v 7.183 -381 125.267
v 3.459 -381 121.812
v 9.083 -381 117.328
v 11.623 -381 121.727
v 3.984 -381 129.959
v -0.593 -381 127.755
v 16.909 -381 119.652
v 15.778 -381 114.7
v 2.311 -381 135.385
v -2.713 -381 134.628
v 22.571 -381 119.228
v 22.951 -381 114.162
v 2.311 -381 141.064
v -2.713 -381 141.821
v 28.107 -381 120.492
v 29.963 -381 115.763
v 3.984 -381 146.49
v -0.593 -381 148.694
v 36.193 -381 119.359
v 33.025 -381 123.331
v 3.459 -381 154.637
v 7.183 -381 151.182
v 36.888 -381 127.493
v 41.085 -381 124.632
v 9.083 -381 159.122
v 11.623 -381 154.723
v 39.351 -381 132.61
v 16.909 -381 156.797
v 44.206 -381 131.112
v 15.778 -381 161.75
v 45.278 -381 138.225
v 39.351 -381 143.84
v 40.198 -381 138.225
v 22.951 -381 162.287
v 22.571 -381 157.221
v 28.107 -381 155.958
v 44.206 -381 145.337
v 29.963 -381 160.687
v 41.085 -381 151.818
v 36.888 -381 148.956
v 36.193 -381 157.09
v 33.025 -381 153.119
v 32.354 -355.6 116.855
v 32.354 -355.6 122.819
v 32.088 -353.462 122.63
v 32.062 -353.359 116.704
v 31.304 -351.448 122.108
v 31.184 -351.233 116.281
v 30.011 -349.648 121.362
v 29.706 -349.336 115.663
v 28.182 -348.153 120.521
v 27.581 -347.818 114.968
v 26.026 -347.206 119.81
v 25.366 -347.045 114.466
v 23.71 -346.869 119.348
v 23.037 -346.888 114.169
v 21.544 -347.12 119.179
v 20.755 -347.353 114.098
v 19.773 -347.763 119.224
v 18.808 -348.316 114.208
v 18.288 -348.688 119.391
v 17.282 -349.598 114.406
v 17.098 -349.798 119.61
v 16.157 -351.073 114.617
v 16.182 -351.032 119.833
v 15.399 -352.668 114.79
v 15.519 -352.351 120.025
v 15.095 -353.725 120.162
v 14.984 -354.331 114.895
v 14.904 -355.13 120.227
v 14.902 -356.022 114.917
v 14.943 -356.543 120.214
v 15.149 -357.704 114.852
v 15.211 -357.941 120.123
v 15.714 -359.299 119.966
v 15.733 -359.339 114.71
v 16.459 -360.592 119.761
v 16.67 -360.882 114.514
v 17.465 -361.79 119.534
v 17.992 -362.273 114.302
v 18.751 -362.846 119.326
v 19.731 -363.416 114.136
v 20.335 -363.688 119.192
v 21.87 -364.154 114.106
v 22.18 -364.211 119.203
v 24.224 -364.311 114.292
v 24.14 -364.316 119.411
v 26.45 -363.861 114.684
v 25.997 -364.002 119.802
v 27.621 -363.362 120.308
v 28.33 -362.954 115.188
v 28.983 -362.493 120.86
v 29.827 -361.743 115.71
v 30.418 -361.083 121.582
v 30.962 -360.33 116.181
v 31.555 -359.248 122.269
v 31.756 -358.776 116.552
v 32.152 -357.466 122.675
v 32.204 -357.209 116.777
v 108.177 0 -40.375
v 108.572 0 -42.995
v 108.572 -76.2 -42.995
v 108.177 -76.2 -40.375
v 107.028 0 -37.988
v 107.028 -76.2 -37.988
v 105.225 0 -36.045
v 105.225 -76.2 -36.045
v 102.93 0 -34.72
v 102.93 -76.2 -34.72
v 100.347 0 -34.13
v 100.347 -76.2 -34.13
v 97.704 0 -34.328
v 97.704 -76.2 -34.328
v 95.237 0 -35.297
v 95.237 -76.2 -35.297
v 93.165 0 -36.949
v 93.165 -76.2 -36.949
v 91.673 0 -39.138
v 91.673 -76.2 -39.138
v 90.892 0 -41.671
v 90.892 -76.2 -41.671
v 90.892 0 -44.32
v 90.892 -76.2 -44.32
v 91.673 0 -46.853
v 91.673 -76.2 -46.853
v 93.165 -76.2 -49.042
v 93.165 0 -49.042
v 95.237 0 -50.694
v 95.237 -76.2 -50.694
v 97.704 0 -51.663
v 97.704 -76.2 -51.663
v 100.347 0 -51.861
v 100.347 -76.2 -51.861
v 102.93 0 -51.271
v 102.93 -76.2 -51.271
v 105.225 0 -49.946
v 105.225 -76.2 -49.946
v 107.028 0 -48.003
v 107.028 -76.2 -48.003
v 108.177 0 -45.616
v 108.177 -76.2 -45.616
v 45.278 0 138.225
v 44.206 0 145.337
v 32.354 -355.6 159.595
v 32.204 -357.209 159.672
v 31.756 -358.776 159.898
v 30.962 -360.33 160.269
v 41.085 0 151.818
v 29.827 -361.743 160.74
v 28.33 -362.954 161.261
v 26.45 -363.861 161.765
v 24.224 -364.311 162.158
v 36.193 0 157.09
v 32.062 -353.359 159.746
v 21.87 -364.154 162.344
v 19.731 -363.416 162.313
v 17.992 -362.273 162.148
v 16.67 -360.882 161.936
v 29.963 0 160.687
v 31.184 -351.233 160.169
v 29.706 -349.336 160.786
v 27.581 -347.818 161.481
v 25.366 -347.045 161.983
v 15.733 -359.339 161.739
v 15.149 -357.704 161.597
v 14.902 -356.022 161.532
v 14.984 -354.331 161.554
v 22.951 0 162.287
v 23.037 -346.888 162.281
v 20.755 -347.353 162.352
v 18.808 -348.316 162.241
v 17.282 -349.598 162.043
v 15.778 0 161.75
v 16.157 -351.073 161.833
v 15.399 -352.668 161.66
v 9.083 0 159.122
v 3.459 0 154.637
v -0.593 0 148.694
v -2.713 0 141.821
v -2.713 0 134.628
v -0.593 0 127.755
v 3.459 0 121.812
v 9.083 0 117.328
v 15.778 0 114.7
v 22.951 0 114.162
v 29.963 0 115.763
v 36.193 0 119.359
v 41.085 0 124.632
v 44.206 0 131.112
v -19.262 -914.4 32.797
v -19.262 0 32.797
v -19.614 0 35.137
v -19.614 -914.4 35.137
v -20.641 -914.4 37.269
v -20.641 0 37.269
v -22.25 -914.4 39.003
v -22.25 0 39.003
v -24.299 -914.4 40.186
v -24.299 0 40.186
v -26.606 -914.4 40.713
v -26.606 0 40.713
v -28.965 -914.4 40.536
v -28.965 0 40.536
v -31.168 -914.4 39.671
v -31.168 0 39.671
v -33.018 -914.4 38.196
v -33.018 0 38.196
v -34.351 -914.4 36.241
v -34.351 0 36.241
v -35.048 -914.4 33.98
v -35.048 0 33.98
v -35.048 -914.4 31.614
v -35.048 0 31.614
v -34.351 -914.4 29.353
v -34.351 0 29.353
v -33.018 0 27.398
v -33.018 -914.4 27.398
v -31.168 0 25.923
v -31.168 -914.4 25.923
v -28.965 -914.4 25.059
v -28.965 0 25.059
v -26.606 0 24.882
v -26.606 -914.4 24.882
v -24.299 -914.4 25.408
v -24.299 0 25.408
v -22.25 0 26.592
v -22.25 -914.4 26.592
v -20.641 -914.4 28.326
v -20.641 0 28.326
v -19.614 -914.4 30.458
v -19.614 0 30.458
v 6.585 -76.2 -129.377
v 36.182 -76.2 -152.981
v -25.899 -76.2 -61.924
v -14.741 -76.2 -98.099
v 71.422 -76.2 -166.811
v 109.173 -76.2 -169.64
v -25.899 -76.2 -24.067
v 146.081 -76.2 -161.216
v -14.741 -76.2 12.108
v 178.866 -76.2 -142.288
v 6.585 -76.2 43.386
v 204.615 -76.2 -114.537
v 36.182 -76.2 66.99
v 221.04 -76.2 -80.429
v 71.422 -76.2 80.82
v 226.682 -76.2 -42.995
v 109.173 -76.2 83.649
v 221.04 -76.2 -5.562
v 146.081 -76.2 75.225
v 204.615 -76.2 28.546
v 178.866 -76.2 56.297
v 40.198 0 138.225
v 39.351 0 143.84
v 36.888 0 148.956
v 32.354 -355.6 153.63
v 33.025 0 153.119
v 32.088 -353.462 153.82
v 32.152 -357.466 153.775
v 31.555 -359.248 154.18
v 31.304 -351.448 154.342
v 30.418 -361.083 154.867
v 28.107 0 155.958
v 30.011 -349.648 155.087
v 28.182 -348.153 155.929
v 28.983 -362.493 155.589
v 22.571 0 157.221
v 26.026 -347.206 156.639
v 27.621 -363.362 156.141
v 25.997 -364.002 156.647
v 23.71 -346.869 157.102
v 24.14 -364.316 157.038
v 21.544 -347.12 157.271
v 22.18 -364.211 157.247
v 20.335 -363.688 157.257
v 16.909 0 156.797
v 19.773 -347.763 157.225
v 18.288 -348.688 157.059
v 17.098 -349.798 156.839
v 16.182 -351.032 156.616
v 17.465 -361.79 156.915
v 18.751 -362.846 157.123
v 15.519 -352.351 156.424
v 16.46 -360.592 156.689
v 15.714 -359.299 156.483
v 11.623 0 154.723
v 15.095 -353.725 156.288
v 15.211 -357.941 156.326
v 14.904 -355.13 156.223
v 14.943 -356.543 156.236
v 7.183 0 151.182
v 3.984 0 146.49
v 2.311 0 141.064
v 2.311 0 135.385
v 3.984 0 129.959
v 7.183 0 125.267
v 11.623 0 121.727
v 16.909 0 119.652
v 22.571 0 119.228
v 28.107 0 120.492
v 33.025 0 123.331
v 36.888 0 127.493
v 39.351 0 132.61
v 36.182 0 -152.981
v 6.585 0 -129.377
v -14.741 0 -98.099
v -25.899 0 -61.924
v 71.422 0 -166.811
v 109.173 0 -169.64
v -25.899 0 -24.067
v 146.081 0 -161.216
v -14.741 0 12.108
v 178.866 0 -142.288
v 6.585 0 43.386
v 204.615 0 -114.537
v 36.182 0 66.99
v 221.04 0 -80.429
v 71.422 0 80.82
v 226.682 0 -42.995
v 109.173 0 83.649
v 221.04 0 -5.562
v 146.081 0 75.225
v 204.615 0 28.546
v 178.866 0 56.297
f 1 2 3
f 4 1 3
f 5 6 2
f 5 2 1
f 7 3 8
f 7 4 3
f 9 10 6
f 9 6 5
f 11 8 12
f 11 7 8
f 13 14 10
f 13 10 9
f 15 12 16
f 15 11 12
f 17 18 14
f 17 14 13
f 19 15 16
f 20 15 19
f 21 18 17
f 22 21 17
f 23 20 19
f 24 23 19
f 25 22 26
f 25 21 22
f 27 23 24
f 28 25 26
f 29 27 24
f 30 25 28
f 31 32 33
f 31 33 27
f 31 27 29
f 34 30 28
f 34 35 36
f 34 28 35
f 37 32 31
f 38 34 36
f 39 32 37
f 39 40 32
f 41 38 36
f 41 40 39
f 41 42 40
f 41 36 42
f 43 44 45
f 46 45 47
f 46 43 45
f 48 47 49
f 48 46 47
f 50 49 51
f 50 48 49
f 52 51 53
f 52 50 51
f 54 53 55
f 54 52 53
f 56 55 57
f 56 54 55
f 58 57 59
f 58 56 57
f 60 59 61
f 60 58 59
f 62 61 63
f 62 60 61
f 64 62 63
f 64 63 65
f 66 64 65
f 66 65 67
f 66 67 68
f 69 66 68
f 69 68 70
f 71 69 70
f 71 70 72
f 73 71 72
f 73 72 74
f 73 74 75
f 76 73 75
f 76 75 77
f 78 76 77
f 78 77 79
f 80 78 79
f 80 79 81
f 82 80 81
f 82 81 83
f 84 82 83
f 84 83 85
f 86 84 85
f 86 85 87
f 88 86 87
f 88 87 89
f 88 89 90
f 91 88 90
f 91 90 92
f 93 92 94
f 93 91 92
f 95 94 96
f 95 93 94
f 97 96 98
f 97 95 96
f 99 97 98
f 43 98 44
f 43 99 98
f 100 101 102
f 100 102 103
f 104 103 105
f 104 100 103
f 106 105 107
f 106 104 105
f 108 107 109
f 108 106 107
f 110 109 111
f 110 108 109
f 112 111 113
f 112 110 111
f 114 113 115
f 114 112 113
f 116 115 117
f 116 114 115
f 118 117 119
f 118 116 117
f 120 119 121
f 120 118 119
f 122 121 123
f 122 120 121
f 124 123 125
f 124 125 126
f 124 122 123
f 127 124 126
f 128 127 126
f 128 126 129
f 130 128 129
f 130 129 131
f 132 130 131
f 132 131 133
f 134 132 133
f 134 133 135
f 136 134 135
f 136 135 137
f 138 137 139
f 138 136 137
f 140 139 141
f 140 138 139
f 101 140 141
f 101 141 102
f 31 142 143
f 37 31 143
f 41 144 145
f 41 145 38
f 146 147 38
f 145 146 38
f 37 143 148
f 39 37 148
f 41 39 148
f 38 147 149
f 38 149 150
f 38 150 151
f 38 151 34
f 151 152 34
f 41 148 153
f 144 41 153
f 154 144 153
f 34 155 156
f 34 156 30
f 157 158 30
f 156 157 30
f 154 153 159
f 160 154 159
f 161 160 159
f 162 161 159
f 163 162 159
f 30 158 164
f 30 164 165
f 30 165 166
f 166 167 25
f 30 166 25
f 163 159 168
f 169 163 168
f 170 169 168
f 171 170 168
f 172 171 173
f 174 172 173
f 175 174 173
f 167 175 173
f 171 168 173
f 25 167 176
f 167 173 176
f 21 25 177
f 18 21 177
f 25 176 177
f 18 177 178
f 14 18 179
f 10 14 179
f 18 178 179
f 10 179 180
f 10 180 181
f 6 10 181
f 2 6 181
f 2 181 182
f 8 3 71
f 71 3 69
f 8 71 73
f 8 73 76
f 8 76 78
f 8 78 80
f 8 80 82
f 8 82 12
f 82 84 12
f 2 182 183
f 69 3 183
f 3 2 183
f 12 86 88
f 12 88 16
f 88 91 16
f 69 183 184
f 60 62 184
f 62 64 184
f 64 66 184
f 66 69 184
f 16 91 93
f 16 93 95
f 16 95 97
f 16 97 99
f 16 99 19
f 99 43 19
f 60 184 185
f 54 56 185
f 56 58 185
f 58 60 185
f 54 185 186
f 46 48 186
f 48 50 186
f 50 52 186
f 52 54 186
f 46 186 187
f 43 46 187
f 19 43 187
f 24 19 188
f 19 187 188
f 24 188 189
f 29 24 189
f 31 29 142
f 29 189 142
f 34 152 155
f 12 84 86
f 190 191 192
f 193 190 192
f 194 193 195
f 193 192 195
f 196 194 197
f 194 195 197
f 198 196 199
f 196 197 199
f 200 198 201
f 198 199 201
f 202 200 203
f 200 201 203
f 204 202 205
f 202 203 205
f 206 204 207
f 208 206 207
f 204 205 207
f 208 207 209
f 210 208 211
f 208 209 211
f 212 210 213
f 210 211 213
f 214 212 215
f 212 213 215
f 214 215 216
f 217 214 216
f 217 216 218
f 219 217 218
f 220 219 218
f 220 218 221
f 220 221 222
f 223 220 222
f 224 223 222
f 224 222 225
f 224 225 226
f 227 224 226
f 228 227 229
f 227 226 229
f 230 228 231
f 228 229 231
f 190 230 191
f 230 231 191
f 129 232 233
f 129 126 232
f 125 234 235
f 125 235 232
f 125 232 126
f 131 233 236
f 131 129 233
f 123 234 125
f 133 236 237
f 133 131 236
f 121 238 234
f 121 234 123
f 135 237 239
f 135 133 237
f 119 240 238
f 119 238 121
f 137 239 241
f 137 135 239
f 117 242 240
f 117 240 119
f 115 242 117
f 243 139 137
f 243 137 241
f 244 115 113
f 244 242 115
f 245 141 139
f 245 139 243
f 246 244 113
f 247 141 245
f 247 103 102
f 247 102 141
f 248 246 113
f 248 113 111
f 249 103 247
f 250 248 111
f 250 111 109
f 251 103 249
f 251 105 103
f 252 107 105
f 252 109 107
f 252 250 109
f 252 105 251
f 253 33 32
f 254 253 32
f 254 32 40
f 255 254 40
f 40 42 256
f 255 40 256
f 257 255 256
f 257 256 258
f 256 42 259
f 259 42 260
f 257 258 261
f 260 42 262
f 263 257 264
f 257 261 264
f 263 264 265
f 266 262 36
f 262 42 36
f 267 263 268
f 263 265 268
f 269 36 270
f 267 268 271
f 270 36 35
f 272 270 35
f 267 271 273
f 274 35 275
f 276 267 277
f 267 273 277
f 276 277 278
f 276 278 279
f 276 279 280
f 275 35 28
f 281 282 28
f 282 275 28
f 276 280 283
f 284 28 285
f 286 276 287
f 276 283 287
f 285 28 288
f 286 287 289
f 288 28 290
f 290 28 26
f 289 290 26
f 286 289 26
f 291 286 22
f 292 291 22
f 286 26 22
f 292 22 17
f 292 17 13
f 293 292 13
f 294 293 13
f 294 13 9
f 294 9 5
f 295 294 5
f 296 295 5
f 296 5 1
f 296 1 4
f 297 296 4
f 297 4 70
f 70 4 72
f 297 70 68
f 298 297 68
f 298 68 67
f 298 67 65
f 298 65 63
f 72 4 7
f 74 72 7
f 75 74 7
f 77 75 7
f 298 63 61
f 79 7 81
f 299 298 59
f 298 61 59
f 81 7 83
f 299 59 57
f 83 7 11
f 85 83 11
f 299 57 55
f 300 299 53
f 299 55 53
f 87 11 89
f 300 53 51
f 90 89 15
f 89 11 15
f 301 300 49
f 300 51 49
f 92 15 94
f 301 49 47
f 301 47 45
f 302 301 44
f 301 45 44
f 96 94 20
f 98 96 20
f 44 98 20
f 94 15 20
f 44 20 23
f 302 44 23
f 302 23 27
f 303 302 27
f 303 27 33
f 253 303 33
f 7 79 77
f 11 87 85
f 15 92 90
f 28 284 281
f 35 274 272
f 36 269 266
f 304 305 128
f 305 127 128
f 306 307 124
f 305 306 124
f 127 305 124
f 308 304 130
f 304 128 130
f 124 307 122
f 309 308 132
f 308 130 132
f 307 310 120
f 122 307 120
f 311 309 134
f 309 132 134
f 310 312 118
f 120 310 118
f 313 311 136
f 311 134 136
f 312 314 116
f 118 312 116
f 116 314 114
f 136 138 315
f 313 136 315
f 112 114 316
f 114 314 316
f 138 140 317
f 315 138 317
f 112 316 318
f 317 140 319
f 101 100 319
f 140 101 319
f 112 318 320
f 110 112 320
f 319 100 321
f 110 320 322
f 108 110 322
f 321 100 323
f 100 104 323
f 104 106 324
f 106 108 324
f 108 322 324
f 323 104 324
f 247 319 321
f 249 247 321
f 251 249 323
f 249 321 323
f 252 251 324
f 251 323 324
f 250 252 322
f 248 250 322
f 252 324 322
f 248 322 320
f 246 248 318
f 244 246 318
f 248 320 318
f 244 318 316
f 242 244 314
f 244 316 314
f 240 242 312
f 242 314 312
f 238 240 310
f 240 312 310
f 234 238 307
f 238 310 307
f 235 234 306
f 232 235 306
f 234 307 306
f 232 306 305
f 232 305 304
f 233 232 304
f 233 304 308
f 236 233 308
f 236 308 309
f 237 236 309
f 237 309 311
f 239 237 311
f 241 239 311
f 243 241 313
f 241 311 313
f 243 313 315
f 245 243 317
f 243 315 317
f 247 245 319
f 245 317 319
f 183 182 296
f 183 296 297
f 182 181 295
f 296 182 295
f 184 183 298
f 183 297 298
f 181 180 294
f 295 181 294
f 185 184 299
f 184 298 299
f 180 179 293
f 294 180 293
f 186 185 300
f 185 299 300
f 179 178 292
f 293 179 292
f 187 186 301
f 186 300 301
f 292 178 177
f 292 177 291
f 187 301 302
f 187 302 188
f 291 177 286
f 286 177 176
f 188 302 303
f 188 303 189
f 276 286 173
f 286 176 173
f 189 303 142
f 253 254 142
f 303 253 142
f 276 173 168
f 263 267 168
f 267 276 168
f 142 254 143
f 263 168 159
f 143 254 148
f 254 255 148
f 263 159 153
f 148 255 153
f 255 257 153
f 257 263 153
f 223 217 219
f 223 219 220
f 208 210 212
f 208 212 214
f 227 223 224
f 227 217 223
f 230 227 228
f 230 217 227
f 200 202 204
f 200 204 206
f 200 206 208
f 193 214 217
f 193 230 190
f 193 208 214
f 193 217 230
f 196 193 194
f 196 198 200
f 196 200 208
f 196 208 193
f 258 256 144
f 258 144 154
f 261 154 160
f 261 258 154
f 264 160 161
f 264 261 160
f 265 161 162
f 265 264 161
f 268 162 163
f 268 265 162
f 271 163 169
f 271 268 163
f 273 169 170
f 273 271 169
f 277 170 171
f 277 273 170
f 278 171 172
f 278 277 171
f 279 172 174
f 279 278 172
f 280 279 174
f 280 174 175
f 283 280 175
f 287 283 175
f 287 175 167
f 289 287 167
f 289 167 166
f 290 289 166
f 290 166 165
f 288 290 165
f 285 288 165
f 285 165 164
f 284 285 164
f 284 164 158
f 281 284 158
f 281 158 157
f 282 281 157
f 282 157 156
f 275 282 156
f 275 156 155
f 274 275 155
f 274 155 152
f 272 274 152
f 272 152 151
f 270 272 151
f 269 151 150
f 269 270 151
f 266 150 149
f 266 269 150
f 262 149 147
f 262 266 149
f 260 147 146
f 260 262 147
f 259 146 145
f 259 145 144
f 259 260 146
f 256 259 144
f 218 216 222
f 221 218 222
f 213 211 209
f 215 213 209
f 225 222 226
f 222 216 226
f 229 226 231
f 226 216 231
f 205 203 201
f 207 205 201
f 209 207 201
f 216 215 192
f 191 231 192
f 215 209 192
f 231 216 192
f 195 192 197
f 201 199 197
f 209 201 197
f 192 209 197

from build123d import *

# Parameters (mm, degrees)
F0_R     = 7.9375
F1_DEPTH = 914.4
F0_R_2   = 127
F0_R_3   = 8.89
F2_DEPTH = 76.2
F0_R_4   = 24.13
F3_DEPTH = 381
F4_R     = 19.05
F5_DEPTH = 381.001
F6_R     = 8.73125
F7_DEPTH = 254


with BuildPart() as f1:
    # F0 (on Front) → F1 (new body)
    with BuildSketch(Plane.XZ):
        with Locations((-27.199171, 32.797288)):
            Circle(F0_R)
    extrude(amount=F1_DEPTH)


with BuildPart() as f2:
    # F0 (on Front) → F2 (new body)
    with BuildSketch(Plane.XZ):
        with Locations((99.682331, -42.99549)):
            Circle(F0_R_2)
        with Locations((99.682331, -42.99549)):
            Circle(F0_R_3, mode=Mode.SUBTRACT)
    extrude(amount=F2_DEPTH)


with BuildPart() as f3:
    # F0 (on Front) → F3 (new body)
    with BuildSketch(Plane.XZ):
        with Locations((21.147744, 138.224724)):
            Circle(F0_R_4)
    extrude(amount=F3_DEPTH)

    # F4 (on face) → F5 (cut, through all)
    with BuildSketch(Plane.XZ.offset(381)):
        with Locations((21.147744, 138.224724)):
            Circle(F4_R)
    extrude(amount=-F5_DEPTH, mode=Mode.SUBTRACT)

    # F6 (on Top) → F7 (cut)
    with BuildSketch(Plane.XY):
        with Locations((23.622749, -355.6)):
            Circle(F6_R)
    extrude(amount=F7_DEPTH, mode=Mode.SUBTRACT)


solid = Compound([f1.part, f2.part, f3.part])
